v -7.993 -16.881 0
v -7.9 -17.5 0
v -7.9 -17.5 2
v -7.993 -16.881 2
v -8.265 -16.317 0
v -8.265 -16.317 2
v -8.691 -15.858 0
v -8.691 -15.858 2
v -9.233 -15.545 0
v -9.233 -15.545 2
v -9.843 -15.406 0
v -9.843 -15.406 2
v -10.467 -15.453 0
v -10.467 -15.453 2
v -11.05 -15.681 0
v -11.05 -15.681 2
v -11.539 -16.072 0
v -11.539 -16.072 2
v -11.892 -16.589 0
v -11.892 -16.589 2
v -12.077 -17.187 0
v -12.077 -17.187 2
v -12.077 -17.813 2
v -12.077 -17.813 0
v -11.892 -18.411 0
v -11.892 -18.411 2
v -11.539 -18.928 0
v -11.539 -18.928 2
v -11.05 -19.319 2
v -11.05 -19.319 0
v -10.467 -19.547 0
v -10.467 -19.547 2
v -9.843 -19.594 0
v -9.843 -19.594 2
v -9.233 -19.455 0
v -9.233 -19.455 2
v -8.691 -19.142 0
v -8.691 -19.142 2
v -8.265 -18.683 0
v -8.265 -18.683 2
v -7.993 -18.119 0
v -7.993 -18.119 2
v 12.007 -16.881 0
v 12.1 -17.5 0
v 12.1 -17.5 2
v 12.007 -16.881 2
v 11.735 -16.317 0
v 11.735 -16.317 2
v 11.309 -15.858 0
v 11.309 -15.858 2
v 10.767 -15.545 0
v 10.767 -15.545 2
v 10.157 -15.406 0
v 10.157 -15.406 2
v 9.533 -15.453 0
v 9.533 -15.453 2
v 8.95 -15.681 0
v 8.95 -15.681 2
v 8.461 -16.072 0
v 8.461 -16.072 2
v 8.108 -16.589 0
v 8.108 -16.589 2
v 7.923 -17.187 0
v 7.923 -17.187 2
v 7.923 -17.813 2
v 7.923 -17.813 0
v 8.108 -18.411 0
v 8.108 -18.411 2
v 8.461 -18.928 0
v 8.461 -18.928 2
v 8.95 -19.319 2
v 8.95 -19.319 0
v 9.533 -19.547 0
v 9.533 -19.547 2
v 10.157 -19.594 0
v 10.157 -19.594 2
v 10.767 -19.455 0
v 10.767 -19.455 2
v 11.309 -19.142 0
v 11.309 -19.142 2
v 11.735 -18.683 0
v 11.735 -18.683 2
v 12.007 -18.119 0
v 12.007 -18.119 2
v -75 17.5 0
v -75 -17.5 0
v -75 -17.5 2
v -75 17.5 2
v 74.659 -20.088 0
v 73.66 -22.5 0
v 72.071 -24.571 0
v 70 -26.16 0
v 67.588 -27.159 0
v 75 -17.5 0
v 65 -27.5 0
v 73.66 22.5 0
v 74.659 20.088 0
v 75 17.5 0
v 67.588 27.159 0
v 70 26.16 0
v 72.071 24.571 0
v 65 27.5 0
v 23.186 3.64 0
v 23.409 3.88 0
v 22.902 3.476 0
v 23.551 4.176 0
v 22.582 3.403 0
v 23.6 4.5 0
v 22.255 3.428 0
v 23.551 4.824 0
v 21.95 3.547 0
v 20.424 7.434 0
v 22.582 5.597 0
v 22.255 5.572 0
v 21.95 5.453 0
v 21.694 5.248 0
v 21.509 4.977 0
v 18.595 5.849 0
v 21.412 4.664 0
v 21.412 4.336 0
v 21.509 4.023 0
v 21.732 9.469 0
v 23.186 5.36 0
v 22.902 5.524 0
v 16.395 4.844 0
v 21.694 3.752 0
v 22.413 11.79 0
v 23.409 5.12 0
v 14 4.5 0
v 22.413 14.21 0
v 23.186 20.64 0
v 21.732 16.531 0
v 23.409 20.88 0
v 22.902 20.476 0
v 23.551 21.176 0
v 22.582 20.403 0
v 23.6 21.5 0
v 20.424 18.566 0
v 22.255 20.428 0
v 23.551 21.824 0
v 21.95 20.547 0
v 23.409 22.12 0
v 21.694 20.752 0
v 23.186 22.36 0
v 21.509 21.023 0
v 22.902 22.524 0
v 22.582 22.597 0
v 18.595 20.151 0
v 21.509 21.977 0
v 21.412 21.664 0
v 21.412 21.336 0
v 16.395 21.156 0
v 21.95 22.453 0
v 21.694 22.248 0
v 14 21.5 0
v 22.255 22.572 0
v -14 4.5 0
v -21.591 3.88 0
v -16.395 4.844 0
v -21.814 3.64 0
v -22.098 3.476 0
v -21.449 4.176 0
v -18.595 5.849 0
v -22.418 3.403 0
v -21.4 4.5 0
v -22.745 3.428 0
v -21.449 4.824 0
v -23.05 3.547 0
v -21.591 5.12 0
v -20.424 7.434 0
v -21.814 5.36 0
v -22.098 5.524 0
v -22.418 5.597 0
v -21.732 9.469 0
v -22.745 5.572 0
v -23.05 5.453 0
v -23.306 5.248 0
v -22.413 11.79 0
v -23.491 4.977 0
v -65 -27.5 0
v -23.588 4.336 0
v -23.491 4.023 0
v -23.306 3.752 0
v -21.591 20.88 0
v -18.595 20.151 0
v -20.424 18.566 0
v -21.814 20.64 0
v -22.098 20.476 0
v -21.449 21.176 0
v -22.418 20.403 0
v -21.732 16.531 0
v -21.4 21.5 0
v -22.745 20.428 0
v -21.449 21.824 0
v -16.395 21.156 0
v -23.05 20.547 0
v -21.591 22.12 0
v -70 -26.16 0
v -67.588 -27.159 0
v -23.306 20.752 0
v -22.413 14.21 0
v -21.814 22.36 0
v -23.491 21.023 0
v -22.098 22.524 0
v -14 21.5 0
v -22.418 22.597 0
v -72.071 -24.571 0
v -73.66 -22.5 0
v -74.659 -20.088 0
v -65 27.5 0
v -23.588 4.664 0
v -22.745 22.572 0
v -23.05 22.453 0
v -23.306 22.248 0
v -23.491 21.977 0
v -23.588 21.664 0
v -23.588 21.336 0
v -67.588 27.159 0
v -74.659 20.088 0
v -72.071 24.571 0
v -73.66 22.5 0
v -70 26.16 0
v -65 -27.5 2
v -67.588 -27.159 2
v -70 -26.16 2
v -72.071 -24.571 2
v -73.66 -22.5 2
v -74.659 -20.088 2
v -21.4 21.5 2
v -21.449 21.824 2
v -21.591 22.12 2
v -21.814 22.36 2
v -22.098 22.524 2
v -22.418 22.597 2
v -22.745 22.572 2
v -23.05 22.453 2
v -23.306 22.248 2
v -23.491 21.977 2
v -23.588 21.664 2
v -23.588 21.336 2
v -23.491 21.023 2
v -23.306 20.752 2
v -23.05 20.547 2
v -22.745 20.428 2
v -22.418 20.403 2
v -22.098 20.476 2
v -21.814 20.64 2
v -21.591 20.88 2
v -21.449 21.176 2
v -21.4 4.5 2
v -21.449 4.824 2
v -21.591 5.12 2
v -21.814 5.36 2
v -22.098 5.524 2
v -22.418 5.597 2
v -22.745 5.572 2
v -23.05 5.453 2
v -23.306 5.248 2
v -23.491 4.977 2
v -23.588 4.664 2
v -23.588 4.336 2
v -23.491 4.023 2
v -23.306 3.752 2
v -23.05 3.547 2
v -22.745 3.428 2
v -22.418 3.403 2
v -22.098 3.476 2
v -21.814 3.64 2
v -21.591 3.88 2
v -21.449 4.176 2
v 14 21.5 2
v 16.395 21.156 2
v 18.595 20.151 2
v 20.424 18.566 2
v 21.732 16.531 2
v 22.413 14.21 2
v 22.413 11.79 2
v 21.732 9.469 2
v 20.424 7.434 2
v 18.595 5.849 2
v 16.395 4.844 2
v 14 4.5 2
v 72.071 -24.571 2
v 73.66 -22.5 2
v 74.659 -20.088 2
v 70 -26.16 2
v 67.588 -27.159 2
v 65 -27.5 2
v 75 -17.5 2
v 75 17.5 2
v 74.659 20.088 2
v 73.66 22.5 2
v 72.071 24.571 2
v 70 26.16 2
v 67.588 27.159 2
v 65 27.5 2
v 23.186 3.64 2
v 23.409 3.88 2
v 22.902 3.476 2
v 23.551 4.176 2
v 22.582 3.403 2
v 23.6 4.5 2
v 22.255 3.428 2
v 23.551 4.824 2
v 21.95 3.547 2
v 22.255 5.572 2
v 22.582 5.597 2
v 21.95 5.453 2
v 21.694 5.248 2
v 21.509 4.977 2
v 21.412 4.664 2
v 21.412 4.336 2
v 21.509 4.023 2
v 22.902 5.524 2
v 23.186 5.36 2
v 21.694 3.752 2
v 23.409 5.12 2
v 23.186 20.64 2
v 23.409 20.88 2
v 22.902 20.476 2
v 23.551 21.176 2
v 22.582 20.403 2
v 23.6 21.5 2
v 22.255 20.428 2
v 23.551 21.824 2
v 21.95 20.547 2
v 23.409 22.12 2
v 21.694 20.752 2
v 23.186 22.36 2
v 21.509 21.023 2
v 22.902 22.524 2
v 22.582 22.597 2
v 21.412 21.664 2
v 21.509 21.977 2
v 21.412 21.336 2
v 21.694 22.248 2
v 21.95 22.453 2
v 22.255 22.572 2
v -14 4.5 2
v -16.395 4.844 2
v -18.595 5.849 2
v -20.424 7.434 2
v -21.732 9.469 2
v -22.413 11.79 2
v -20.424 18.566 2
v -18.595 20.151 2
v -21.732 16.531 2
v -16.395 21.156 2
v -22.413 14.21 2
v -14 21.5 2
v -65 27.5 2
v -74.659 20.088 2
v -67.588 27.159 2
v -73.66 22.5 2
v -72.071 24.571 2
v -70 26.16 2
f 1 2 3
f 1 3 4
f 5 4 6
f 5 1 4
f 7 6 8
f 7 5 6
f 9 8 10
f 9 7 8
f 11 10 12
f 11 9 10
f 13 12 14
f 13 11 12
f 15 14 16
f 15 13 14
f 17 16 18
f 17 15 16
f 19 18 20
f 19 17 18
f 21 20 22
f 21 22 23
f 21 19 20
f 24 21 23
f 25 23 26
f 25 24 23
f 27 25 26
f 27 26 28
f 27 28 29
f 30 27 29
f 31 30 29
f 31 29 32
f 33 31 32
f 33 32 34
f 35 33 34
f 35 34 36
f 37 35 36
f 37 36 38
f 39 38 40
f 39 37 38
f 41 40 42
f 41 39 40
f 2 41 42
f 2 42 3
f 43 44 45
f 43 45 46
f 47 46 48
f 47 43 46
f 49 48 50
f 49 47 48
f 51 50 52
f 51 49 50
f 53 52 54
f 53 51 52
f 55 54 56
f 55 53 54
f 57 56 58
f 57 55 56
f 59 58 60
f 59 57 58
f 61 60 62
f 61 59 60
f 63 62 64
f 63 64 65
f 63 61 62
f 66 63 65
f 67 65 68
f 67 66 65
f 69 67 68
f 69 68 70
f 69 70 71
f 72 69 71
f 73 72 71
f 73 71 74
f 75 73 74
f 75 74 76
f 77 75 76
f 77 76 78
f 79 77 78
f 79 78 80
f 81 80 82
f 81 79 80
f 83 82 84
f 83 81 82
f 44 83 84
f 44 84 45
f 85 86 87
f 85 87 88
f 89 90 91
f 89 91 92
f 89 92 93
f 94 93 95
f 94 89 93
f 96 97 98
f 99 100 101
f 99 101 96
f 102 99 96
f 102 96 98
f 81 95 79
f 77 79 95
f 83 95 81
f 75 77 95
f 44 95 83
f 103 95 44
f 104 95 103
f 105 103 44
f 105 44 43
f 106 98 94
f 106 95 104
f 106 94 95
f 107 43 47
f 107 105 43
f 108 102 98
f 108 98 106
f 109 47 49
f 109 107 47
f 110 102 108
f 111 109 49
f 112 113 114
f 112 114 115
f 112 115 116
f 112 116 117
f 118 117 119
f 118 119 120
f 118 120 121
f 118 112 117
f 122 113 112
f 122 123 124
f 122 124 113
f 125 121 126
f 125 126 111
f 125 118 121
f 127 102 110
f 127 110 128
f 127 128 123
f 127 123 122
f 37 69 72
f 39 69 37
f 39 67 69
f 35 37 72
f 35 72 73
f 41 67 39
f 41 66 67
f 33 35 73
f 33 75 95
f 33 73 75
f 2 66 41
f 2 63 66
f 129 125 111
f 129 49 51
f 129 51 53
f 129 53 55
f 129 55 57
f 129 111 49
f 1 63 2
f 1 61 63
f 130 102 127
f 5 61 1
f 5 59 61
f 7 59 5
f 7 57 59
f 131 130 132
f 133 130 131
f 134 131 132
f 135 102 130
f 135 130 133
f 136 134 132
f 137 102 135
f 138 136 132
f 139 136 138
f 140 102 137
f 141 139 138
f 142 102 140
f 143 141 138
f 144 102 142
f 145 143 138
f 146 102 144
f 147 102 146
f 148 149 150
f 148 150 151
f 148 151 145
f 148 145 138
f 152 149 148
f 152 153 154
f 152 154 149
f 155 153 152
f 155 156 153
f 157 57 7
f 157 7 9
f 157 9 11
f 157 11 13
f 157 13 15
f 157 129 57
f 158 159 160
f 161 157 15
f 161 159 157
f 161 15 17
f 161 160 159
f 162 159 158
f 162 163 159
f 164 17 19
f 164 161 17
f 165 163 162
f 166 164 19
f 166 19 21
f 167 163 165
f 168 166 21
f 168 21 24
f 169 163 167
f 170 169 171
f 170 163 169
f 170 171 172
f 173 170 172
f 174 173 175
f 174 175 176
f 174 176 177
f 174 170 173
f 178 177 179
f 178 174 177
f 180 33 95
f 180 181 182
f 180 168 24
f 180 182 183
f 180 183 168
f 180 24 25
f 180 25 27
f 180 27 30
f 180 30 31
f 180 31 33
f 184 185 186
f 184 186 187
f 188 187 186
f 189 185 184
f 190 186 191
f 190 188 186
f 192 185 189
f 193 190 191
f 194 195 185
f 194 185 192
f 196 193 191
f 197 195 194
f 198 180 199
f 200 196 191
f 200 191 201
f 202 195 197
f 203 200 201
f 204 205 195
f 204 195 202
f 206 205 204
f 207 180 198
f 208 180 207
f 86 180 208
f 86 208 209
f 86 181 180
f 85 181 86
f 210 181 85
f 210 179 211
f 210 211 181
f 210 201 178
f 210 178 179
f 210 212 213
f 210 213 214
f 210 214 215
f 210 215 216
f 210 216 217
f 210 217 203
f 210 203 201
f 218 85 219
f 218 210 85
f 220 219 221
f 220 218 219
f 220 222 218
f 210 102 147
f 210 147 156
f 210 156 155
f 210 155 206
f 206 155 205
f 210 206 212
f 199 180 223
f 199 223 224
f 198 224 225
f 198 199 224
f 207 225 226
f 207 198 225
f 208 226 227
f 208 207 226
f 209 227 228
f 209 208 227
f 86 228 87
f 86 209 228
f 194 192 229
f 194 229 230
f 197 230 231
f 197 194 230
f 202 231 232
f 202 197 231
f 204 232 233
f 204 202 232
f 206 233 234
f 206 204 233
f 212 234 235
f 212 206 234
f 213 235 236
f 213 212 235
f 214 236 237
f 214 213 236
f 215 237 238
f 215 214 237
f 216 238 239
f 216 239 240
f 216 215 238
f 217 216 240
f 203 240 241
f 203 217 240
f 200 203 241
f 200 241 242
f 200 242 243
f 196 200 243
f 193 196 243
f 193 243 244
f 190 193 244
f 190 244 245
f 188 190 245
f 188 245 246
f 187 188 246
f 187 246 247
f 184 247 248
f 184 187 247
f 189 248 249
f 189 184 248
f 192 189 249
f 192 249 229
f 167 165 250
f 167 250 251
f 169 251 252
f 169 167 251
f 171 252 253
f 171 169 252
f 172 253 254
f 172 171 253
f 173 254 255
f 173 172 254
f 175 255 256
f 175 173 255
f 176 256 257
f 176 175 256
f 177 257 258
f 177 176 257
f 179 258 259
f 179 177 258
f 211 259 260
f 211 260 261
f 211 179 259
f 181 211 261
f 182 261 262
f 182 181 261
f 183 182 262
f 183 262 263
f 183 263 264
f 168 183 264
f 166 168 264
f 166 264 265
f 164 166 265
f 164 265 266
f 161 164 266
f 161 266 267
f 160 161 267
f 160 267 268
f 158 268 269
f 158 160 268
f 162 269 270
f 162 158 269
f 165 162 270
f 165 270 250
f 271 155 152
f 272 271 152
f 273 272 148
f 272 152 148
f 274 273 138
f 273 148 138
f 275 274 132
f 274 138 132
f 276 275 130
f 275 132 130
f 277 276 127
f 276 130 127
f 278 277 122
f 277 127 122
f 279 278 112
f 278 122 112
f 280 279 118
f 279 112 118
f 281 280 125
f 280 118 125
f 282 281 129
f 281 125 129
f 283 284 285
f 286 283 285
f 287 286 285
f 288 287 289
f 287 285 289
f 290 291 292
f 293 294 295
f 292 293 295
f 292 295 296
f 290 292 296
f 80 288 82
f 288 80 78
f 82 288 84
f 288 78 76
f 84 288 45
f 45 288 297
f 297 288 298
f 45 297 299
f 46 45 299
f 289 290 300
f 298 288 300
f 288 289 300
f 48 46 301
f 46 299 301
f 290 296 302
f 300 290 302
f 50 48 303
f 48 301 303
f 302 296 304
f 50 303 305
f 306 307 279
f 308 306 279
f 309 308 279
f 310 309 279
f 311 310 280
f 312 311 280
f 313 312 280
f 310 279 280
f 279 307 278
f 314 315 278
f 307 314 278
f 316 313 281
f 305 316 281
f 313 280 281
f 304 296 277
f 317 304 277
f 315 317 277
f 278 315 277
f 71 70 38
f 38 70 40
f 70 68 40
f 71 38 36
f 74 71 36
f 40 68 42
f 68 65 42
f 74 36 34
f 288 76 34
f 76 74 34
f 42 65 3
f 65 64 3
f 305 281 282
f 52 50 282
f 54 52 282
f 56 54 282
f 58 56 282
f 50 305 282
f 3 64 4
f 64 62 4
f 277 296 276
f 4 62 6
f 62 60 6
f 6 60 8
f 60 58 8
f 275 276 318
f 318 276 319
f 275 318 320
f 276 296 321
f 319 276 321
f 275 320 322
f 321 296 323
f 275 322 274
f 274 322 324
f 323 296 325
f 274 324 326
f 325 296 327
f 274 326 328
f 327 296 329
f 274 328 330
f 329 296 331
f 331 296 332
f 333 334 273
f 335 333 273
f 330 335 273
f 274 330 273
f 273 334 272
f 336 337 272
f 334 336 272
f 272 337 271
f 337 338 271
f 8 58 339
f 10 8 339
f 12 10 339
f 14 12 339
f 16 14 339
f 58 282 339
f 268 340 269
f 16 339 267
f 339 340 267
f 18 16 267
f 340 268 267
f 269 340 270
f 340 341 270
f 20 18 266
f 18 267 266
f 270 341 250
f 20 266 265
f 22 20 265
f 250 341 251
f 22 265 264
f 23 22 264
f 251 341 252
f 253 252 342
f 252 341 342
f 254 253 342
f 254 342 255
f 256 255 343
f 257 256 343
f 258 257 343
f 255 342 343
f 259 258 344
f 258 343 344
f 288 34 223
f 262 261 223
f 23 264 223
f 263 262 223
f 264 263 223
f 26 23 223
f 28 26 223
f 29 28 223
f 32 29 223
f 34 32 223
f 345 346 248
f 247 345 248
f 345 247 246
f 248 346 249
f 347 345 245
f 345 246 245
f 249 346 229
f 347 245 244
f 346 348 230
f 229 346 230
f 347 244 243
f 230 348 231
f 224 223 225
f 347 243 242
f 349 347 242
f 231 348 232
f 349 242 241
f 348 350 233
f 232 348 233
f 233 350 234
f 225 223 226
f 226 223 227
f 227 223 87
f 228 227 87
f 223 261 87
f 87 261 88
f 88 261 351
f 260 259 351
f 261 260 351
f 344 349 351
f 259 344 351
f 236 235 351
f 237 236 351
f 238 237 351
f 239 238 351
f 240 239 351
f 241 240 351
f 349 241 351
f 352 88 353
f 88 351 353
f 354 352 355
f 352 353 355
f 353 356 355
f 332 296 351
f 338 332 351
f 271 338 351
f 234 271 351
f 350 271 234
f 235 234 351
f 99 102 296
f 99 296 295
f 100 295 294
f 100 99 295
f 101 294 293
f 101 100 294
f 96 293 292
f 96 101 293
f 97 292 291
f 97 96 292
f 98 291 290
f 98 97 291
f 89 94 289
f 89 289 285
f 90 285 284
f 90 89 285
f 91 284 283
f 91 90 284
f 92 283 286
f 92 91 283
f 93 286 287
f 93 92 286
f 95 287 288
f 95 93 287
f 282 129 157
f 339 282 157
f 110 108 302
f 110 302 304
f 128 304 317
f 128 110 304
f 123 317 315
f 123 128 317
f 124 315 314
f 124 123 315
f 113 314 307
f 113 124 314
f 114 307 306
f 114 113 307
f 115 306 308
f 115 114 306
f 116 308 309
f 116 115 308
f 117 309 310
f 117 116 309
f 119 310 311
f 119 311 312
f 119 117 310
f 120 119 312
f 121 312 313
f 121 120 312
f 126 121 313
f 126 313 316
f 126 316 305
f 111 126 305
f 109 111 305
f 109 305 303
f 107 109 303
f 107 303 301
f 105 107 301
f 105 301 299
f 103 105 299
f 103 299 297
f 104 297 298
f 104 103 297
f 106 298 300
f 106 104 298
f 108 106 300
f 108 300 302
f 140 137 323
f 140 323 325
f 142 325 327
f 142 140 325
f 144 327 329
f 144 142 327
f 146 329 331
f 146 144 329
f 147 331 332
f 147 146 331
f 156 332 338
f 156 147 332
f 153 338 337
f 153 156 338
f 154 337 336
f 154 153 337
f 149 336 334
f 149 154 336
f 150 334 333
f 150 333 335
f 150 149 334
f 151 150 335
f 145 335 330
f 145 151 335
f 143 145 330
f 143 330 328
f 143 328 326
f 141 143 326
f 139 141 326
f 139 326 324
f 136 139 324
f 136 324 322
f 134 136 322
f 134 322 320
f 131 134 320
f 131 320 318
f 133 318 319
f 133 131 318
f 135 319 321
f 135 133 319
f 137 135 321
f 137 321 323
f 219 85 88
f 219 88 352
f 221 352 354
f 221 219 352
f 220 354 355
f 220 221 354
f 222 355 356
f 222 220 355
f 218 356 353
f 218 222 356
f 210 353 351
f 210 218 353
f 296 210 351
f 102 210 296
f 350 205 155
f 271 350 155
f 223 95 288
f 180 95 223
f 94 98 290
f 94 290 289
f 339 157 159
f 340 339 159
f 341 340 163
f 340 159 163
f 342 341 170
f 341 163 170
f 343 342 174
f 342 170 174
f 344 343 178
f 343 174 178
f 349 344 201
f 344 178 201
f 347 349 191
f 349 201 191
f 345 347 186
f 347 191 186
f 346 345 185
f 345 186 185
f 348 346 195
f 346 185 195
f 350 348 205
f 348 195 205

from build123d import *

# Parameters (mm, degrees)
SKETCH_1_R      = 2.1
SKETCH_1_R_2    = 1.1
EXTRUDE_1_DEPTH = 2


with BuildPart() as part:
    # 草图1 → 凸台-拉伸1 (new body)
    with BuildSketch(Plane.XY):
        with BuildLine():
            Line((-65, 27.5), (65, 27.5))
            ThreePointArc((65, 27.5), (72.071067812, 24.571067812), (75, 17.5))
            Line((75, 17.5), (75, -17.5))
            ThreePointArc((75, -17.5), (72.071067812, -24.571067812), (65, -27.5))
            Line((65, -27.5), (-65, -27.5))
            ThreePointArc((-65, -27.5), (-72.071067812, -24.571067812), (-75, -17.5))
            Line((-75, -17.5), (-75, 17.5))
            ThreePointArc((-75, 17.5), (-72.071067812, 24.571067812), (-65, 27.5))
        make_face()
        with Locations((-10, -17.5)):
            Circle(SKETCH_1_R, mode=Mode.SUBTRACT)
        with Locations((10, -17.5)):
            Circle(SKETCH_1_R, mode=Mode.SUBTRACT)
        with Locations((-22.5, 21.5)):
            Circle(SKETCH_1_R_2, mode=Mode.SUBTRACT)
        with Locations((-22.5, 4.5)):
            Circle(SKETCH_1_R_2, mode=Mode.SUBTRACT)
        with Locations((22.5, 4.5)):
            Circle(SKETCH_1_R_2, mode=Mode.SUBTRACT)
        with Locations((22.5, 21.5)):
            Circle(SKETCH_1_R_2, mode=Mode.SUBTRACT)
        with BuildLine():
            Line((-14, 21.5), (14, 21.5))
            ThreePointArc((14, 21.5), (22.5, 13), (14, 4.5))
            Line((14, 4.5), (-14, 4.5))
            ThreePointArc((-14, 4.5), (-22.5, 13), (-14, 21.5))
        make_face(mode=Mode.SUBTRACT)
    extrude(amount=EXTRUDE_1_DEPTH)


solid = part.part
